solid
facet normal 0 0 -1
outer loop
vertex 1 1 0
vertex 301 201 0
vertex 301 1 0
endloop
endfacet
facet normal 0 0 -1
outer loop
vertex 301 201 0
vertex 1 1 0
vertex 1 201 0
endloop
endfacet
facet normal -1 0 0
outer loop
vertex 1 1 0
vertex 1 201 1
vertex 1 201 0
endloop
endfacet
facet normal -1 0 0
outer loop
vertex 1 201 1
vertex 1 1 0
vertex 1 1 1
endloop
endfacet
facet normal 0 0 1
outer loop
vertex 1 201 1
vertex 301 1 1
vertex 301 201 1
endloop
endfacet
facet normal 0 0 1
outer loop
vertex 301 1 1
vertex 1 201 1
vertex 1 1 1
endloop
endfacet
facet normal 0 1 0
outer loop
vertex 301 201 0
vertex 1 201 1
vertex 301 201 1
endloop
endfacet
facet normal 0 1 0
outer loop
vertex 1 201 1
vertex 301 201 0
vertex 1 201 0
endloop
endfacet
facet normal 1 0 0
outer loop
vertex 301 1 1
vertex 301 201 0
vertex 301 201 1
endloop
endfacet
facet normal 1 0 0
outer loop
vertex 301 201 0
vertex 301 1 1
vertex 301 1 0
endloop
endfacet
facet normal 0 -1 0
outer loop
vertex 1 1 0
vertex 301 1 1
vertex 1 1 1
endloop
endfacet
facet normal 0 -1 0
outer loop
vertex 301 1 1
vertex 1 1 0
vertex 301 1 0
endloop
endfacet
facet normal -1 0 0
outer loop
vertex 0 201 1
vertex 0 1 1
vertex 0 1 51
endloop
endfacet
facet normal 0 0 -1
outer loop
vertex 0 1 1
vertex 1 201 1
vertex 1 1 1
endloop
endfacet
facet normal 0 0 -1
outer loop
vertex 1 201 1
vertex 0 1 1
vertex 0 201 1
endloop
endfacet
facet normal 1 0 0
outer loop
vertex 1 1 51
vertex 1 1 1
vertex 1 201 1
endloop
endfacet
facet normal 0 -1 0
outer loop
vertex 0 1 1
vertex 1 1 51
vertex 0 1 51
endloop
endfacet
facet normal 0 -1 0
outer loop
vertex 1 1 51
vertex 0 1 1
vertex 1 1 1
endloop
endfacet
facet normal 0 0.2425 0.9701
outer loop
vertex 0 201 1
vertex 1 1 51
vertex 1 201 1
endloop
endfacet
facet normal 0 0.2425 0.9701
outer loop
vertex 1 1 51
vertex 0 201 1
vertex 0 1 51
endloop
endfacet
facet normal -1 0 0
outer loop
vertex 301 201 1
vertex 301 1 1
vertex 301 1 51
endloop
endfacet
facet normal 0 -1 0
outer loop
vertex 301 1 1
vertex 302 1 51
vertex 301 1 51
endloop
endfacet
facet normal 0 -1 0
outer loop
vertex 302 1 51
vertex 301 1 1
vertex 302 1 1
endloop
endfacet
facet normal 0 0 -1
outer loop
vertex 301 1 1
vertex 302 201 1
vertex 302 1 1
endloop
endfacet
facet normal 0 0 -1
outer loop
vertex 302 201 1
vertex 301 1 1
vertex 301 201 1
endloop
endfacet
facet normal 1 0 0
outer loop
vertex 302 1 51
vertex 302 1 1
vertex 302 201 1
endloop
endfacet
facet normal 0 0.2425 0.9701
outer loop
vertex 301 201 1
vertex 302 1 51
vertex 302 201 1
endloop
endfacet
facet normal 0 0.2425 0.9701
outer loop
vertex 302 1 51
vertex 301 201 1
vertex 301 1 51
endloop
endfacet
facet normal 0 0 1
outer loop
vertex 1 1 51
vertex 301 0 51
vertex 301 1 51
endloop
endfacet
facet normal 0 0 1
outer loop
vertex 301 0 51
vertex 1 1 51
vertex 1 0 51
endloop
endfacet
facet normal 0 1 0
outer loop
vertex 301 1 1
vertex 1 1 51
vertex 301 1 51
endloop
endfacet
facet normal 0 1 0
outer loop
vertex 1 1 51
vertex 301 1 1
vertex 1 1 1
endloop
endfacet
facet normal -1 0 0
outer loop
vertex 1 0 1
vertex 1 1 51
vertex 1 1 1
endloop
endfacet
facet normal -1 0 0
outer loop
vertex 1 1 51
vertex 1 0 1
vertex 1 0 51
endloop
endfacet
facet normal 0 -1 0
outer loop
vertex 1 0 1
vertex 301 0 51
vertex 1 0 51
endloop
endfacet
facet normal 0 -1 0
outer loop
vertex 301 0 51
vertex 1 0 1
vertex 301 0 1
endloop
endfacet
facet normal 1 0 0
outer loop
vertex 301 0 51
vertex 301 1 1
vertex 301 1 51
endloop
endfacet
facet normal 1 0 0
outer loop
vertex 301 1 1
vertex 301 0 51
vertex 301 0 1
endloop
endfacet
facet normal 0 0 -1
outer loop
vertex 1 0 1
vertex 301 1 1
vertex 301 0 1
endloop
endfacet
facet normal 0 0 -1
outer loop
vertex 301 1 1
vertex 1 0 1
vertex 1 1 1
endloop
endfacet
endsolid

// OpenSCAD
thickness=1;
width=300;
length=200;
depth=50;

tabDepth=depth/5;




module bottomPanel(){
square([width,length]);
}



module wing(){
  ;
    polygon(points=[[0,0],[depth,length],[depth,0]]);
}


module back(){
    
square([width,depth]);    
     
}

module twoDBack(){
    
   square([width-thickness*2,depth]);   
}

module tab(){
    
    module halfTab(){
        
            difference(){
    square([tabDepth,depth/2]);
    polygon(points = [[tabDepth,0], [0,tabDepth], [-1,-1]]);}
     }
     
     halfTab();
    
     translate([0,depth,0])
    mirror([0,1,0]){
    difference(){
    square([tabDepth,depth/2]);
    polygon(points = [[tabDepth,0], [0,tabDepth], [-1,-1]]);}
}
}






module threeD(){

translate([thickness,thickness,0])
linear_extrude(thickness)
bottomPanel();


translate([0,thickness,depth+thickness])
rotate([0,90,0])
linear_extrude(thickness)
wing();

translate([width+thickness,thickness,depth+thickness])
rotate([0,90,0])
linear_extrude(thickness)
wing();
    
    translate([thickness,thickness,thickness])
    rotate([90,0,0])
    linear_extrude(thickness)
    back();
    
    }




module flatPack(){
    
    translate([depth,depth,0])
    bottomPanel();
    
    translate([0,depth,0])
    wing();
    
    translate([width+depth*2,depth,0])
   mirror([1,0,0])
    wing();
    
    translate([depth+thickness,0,0])
    twoDBack();
    
    translate([depth-tabDepth+thickness,0,0])
    tab();
   
    translate([depth+width+tabDepth-thickness,0,0])
    mirror([1,0,0])
    tab();
    
}


threeD();
//flatPack();
